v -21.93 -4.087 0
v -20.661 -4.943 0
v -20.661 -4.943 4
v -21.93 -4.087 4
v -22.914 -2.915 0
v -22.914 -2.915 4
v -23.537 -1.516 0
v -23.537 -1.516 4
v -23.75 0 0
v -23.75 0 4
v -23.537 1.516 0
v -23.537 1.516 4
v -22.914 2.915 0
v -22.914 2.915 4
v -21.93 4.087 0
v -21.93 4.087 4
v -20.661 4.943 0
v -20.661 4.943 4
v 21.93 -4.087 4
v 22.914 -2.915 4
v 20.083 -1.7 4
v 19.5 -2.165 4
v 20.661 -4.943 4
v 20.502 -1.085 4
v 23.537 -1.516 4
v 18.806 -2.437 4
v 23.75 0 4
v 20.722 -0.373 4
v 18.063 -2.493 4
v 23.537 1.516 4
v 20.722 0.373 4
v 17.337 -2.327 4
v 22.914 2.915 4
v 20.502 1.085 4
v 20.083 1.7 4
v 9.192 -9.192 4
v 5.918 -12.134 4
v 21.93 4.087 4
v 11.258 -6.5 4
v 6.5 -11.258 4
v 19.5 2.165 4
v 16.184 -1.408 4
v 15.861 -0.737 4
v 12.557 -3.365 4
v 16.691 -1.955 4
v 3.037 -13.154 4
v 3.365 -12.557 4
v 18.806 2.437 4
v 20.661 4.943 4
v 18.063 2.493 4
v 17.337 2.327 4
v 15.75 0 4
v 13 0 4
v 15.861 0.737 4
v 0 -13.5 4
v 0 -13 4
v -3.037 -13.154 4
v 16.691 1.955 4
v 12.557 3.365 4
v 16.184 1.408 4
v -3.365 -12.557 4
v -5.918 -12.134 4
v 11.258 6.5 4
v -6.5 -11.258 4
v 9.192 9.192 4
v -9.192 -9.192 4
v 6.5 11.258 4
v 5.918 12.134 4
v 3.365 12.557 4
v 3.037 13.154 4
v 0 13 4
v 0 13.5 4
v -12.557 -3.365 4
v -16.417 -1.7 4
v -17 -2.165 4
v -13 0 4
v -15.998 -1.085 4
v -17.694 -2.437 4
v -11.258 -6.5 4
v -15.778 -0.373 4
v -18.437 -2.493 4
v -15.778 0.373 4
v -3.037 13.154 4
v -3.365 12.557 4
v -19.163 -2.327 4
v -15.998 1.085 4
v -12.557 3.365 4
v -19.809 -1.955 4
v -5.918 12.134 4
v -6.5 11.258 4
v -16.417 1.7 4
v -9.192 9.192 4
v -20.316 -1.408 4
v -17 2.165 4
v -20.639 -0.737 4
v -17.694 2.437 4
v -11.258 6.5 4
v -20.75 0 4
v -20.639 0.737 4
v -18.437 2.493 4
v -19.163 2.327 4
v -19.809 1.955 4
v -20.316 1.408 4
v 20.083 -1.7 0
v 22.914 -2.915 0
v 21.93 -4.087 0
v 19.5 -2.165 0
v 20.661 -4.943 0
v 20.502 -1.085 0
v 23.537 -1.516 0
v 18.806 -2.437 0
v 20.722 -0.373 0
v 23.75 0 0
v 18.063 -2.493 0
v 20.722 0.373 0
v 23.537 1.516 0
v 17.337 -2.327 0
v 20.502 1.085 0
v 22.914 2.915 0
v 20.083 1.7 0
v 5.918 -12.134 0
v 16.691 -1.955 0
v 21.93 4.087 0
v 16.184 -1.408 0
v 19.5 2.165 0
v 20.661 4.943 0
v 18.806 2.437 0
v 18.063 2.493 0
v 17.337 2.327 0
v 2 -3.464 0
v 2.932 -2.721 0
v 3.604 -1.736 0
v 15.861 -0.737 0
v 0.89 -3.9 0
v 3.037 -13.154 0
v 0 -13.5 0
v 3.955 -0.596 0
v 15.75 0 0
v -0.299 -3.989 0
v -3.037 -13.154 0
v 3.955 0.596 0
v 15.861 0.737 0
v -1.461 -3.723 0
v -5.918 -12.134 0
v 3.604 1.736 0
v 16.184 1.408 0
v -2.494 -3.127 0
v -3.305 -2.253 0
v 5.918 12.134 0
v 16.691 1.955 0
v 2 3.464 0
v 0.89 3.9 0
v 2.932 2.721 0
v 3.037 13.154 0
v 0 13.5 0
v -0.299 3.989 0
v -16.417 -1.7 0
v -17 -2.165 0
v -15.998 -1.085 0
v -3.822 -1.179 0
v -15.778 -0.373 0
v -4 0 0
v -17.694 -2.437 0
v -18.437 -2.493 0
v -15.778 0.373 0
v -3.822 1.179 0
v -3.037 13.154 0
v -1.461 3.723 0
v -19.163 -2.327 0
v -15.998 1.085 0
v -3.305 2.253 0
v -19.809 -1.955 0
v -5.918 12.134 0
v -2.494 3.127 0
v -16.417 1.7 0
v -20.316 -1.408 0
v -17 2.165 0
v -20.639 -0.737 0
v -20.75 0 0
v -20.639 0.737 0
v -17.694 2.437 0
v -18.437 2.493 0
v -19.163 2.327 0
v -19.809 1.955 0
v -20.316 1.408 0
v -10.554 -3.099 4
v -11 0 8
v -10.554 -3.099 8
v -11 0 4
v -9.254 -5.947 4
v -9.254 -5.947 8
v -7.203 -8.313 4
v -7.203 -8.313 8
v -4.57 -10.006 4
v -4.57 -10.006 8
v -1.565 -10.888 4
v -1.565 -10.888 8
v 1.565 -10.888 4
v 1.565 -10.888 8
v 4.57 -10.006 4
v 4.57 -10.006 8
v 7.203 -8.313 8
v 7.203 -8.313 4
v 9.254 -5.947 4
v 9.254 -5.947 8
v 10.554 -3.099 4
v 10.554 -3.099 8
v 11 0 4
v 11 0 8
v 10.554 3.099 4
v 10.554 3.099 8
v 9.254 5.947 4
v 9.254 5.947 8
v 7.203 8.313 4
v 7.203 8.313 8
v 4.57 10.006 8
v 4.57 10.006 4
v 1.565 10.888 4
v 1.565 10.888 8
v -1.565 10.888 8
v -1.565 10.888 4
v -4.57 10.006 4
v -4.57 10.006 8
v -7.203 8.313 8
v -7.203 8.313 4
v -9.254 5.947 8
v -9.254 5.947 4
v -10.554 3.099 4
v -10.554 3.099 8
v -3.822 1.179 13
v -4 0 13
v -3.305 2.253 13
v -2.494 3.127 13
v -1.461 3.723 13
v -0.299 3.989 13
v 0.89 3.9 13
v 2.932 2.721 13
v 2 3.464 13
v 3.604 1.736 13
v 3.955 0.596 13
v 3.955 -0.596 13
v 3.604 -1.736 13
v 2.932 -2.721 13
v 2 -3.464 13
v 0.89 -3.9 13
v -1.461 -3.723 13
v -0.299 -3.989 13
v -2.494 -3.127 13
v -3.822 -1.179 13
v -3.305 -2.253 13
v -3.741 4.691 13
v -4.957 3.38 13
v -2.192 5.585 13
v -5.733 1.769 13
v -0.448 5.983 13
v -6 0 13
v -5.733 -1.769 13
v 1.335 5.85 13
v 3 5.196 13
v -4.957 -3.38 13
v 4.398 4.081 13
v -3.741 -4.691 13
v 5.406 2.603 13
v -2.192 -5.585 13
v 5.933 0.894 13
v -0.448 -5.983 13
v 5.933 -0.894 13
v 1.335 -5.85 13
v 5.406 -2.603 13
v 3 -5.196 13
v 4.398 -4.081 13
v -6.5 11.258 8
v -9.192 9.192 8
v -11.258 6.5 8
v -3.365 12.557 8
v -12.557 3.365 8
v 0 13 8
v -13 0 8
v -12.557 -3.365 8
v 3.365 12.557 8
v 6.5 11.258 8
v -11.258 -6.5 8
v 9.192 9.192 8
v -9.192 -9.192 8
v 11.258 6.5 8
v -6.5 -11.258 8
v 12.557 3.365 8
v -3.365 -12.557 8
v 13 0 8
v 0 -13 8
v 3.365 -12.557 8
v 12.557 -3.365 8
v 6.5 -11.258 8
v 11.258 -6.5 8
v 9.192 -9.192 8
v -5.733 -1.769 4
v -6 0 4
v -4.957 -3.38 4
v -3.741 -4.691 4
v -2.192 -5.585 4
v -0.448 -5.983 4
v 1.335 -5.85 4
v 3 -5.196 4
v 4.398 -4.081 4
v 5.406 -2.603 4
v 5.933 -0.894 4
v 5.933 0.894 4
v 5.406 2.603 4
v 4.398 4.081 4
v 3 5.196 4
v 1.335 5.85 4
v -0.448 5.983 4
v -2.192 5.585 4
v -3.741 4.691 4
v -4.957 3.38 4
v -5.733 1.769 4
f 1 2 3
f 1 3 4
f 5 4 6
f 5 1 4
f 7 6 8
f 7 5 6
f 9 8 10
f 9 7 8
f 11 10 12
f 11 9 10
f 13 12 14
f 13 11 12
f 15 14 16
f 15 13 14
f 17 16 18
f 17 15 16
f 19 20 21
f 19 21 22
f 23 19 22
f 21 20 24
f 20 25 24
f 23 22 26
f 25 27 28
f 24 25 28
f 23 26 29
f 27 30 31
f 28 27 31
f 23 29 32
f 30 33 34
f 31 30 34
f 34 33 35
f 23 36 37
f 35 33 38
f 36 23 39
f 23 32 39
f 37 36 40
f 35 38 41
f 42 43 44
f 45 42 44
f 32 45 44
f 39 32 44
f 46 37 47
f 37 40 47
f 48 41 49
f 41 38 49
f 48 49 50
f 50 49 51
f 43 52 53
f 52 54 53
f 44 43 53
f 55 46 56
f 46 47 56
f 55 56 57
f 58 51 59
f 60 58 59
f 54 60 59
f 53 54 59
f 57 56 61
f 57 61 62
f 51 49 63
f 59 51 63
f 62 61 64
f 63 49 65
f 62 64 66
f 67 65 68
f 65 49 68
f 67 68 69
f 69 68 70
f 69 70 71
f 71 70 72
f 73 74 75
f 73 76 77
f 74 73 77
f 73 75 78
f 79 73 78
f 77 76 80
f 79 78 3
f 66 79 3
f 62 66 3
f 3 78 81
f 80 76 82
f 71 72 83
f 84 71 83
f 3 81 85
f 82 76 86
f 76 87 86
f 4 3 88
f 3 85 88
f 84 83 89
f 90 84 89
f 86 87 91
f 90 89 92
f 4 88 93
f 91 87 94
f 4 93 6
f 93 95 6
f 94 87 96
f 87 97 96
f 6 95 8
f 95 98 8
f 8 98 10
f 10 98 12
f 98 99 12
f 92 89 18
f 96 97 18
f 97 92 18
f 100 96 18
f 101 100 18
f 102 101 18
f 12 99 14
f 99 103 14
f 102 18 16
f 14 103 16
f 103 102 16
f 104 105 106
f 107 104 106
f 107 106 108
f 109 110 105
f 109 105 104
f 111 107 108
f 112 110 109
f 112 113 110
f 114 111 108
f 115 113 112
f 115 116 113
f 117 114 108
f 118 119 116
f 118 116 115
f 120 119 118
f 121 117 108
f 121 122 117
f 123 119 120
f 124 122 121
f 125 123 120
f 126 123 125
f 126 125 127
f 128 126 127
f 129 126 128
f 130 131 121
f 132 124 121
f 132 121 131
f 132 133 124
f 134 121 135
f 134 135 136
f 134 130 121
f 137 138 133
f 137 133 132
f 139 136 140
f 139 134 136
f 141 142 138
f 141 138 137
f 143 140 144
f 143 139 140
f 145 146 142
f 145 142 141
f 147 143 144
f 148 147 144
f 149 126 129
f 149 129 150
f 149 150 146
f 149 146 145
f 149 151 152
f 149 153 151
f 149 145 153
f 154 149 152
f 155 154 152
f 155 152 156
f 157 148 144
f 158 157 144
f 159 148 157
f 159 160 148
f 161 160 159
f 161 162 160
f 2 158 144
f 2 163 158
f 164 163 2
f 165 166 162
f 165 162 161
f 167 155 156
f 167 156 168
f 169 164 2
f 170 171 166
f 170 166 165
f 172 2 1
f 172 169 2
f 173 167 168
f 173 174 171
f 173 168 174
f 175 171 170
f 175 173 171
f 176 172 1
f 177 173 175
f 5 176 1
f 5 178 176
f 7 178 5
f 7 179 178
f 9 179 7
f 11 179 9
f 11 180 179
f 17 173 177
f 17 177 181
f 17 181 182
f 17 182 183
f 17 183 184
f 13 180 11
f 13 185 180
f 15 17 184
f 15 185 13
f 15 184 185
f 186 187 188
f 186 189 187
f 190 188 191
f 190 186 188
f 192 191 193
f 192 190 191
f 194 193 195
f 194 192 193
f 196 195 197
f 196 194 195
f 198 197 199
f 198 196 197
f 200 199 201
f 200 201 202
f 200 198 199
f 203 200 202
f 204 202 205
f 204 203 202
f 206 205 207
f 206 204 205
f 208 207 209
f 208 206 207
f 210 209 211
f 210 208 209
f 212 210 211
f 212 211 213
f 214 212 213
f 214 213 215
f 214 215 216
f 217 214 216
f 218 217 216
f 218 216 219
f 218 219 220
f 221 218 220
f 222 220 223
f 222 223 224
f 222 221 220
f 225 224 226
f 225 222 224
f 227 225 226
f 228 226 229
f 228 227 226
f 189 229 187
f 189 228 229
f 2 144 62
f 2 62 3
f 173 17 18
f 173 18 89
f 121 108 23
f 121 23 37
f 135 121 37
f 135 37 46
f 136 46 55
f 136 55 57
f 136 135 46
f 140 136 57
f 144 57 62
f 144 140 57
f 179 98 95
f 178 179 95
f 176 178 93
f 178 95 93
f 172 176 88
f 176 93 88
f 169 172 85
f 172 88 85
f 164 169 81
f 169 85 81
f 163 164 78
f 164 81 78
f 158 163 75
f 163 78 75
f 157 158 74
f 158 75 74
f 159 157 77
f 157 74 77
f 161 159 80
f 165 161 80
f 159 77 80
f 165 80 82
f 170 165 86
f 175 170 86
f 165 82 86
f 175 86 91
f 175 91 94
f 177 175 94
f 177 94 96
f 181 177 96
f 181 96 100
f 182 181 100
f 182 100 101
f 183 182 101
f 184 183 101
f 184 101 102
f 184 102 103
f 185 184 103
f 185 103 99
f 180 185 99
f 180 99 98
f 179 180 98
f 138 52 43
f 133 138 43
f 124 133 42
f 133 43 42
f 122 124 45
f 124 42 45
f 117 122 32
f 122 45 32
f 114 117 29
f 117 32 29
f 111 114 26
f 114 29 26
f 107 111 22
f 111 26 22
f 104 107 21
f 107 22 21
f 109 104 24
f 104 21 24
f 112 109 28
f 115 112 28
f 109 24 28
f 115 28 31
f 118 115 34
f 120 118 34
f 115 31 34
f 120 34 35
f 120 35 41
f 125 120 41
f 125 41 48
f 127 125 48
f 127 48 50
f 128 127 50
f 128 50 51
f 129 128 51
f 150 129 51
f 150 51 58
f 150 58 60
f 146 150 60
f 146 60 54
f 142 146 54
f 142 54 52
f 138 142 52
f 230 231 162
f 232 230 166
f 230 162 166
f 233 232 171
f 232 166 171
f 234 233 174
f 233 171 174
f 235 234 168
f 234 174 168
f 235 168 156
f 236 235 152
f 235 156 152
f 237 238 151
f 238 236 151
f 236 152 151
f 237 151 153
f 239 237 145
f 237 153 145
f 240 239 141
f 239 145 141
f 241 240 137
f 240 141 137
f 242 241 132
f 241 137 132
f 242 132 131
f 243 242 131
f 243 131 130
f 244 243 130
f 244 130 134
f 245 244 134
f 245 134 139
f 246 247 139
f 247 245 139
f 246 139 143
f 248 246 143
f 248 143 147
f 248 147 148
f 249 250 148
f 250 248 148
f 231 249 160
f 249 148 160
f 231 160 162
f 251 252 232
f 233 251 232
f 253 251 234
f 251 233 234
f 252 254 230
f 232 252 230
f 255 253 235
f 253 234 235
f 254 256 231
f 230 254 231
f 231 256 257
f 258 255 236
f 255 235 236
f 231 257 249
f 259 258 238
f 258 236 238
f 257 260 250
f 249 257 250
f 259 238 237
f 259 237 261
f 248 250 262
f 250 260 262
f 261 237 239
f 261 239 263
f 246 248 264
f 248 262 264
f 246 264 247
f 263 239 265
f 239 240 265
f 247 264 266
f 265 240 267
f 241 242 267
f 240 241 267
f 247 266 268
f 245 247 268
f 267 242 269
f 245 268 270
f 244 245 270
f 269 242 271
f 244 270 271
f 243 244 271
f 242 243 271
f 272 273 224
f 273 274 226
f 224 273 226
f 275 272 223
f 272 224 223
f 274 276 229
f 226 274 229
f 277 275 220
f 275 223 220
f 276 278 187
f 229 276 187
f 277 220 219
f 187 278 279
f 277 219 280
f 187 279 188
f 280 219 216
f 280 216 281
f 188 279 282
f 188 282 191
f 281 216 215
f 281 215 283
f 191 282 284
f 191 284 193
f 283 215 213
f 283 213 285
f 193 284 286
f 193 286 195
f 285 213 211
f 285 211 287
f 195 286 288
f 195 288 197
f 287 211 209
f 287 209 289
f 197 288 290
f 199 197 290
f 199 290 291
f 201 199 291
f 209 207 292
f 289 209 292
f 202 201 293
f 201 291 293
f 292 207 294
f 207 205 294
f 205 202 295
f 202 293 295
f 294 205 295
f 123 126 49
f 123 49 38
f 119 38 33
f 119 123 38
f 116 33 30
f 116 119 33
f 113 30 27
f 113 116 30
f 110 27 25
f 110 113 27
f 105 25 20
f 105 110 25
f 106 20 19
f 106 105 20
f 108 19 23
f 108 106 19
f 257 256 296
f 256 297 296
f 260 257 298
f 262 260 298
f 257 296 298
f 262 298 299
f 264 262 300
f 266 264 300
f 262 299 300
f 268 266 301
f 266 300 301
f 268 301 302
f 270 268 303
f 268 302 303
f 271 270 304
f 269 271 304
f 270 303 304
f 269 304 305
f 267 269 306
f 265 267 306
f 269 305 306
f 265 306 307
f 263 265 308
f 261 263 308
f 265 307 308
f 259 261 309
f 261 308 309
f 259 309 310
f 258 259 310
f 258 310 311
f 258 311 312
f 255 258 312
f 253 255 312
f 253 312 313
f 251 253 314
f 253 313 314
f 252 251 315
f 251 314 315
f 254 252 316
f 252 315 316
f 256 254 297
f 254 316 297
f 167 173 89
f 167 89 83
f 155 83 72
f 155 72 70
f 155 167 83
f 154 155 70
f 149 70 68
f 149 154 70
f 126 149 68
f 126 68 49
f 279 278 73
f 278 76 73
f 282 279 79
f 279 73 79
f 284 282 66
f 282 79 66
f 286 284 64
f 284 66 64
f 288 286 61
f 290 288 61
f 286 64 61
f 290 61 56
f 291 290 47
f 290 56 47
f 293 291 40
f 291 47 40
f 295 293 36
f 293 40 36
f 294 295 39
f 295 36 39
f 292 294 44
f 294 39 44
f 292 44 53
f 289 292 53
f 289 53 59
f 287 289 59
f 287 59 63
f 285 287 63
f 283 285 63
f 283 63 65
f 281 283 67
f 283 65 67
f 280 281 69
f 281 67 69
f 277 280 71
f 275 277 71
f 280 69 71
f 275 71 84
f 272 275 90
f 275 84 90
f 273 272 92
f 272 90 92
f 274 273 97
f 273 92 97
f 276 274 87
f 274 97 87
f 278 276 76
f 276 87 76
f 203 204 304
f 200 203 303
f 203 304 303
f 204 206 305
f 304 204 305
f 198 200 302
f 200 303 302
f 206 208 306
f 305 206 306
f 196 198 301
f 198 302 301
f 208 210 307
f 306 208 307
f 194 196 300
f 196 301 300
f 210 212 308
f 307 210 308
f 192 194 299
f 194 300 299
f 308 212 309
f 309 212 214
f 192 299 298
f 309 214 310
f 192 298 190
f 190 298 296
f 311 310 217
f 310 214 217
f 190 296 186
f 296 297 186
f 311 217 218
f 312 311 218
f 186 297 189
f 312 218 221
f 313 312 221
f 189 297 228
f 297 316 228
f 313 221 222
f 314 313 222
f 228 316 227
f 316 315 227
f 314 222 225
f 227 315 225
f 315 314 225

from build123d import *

# Parameters (mm, degrees)
BOSS_EXTRUDE5_DEPTH       = 4
SKETCH5_W                 = 2
SKETCH5_H                 = 4
F_5_0MM_DOWEL_HOLE1_D     = 5
F_5_0MM_DOWEL_HOLE1_DEPTH = 10.1
F_5_0MM_DOWEL_HOLE1_TIP   = 1.502151548
F_8_0MM_DOWEL_HOLE1_D     = 8
F_8_0MM_DOWEL_HOLE1_DEPTH = 10.1
F_8_0MM_DOWEL_HOLE1_TIP   = 2.403442476


with BuildPart() as part:
    # Sketch1 → Boss-Extrude5 (new body)
    with BuildSketch(Plane.XY):
        with BuildLine():
            Line((-20.660958904, 4.943407445), (-5.917808219, 12.133818273))
            ThreePointArc((-5.917808219, 12.133818273), (0, 13.5), (5.917808219, 12.133818273))
            Line((5.917808219, 12.133818273), (20.660958904, 4.943407445))
            ThreePointArc((20.660958904, 4.943407445), (23.75, 0), (20.660958904, -4.943407445))
            Line((20.660958904, -4.943407445), (5.917808219, -12.133818273))
            ThreePointArc((5.917808219, -12.133818273), (0, -13.5), (-5.917808219, -12.133818273))
            Line((-5.917808219, -12.133818273), (-20.660958904, -4.943407445))
            ThreePointArc((-20.660958904, -4.943407445), (-23.75, 0), (-20.660958904, 4.943407445))
        make_face()
    extrude(amount=BOSS_EXTRUDE5_DEPTH)

    # Sketch5 → Revolve2 (revolve)
    with BuildSketch(Plane(origin=(0, 0, 0), x_dir=(1, 0, 0), z_dir=(0, 1, 0)), mode=Mode.PRIVATE) as revolve2_sk:
        Polygon((4, -13), (6, -13), (6, -10.51697017), (6, -4), (4, -4), align=None)
        with Locations((12, -6)):
            Rectangle(SKETCH5_W, SKETCH5_H)
    revolve(revolve2_sk.sketch.rotate(Axis((0, 0, -13.433754879), (0, 0, 1)), 180), axis=Axis((0, 0, -13.433754879), (0, 0, 1)))

    # Ø5.0mm Dowel Hole1
    with Locations(Plane(origin=(0, 0, 0), x_dir=(1, 0, 0), z_dir=(0, 0, -1))):
        with Locations((18.25, 0), (-18.25, 0)):
            Hole(F_5_0MM_DOWEL_HOLE1_D / 2, depth=F_5_0MM_DOWEL_HOLE1_DEPTH)
            with Locations((0, 0, -(F_5_0MM_DOWEL_HOLE1_DEPTH + F_5_0MM_DOWEL_HOLE1_TIP / 2))):  # 118° drill point
                Cone(0, F_5_0MM_DOWEL_HOLE1_D / 2, F_5_0MM_DOWEL_HOLE1_TIP, mode=Mode.SUBTRACT)

    # Ø8.0mm Dowel Hole1
    with Locations(Plane.XY.offset(4)):
        with Locations((0, 0)):
            Hole(F_8_0MM_DOWEL_HOLE1_D / 2, depth=F_8_0MM_DOWEL_HOLE1_DEPTH)
            with Locations((0, 0, -(F_8_0MM_DOWEL_HOLE1_DEPTH + F_8_0MM_DOWEL_HOLE1_TIP / 2))):  # 118° drill point
                Cone(0, F_8_0MM_DOWEL_HOLE1_D / 2, F_8_0MM_DOWEL_HOLE1_TIP, mode=Mode.SUBTRACT)


solid = part.part
